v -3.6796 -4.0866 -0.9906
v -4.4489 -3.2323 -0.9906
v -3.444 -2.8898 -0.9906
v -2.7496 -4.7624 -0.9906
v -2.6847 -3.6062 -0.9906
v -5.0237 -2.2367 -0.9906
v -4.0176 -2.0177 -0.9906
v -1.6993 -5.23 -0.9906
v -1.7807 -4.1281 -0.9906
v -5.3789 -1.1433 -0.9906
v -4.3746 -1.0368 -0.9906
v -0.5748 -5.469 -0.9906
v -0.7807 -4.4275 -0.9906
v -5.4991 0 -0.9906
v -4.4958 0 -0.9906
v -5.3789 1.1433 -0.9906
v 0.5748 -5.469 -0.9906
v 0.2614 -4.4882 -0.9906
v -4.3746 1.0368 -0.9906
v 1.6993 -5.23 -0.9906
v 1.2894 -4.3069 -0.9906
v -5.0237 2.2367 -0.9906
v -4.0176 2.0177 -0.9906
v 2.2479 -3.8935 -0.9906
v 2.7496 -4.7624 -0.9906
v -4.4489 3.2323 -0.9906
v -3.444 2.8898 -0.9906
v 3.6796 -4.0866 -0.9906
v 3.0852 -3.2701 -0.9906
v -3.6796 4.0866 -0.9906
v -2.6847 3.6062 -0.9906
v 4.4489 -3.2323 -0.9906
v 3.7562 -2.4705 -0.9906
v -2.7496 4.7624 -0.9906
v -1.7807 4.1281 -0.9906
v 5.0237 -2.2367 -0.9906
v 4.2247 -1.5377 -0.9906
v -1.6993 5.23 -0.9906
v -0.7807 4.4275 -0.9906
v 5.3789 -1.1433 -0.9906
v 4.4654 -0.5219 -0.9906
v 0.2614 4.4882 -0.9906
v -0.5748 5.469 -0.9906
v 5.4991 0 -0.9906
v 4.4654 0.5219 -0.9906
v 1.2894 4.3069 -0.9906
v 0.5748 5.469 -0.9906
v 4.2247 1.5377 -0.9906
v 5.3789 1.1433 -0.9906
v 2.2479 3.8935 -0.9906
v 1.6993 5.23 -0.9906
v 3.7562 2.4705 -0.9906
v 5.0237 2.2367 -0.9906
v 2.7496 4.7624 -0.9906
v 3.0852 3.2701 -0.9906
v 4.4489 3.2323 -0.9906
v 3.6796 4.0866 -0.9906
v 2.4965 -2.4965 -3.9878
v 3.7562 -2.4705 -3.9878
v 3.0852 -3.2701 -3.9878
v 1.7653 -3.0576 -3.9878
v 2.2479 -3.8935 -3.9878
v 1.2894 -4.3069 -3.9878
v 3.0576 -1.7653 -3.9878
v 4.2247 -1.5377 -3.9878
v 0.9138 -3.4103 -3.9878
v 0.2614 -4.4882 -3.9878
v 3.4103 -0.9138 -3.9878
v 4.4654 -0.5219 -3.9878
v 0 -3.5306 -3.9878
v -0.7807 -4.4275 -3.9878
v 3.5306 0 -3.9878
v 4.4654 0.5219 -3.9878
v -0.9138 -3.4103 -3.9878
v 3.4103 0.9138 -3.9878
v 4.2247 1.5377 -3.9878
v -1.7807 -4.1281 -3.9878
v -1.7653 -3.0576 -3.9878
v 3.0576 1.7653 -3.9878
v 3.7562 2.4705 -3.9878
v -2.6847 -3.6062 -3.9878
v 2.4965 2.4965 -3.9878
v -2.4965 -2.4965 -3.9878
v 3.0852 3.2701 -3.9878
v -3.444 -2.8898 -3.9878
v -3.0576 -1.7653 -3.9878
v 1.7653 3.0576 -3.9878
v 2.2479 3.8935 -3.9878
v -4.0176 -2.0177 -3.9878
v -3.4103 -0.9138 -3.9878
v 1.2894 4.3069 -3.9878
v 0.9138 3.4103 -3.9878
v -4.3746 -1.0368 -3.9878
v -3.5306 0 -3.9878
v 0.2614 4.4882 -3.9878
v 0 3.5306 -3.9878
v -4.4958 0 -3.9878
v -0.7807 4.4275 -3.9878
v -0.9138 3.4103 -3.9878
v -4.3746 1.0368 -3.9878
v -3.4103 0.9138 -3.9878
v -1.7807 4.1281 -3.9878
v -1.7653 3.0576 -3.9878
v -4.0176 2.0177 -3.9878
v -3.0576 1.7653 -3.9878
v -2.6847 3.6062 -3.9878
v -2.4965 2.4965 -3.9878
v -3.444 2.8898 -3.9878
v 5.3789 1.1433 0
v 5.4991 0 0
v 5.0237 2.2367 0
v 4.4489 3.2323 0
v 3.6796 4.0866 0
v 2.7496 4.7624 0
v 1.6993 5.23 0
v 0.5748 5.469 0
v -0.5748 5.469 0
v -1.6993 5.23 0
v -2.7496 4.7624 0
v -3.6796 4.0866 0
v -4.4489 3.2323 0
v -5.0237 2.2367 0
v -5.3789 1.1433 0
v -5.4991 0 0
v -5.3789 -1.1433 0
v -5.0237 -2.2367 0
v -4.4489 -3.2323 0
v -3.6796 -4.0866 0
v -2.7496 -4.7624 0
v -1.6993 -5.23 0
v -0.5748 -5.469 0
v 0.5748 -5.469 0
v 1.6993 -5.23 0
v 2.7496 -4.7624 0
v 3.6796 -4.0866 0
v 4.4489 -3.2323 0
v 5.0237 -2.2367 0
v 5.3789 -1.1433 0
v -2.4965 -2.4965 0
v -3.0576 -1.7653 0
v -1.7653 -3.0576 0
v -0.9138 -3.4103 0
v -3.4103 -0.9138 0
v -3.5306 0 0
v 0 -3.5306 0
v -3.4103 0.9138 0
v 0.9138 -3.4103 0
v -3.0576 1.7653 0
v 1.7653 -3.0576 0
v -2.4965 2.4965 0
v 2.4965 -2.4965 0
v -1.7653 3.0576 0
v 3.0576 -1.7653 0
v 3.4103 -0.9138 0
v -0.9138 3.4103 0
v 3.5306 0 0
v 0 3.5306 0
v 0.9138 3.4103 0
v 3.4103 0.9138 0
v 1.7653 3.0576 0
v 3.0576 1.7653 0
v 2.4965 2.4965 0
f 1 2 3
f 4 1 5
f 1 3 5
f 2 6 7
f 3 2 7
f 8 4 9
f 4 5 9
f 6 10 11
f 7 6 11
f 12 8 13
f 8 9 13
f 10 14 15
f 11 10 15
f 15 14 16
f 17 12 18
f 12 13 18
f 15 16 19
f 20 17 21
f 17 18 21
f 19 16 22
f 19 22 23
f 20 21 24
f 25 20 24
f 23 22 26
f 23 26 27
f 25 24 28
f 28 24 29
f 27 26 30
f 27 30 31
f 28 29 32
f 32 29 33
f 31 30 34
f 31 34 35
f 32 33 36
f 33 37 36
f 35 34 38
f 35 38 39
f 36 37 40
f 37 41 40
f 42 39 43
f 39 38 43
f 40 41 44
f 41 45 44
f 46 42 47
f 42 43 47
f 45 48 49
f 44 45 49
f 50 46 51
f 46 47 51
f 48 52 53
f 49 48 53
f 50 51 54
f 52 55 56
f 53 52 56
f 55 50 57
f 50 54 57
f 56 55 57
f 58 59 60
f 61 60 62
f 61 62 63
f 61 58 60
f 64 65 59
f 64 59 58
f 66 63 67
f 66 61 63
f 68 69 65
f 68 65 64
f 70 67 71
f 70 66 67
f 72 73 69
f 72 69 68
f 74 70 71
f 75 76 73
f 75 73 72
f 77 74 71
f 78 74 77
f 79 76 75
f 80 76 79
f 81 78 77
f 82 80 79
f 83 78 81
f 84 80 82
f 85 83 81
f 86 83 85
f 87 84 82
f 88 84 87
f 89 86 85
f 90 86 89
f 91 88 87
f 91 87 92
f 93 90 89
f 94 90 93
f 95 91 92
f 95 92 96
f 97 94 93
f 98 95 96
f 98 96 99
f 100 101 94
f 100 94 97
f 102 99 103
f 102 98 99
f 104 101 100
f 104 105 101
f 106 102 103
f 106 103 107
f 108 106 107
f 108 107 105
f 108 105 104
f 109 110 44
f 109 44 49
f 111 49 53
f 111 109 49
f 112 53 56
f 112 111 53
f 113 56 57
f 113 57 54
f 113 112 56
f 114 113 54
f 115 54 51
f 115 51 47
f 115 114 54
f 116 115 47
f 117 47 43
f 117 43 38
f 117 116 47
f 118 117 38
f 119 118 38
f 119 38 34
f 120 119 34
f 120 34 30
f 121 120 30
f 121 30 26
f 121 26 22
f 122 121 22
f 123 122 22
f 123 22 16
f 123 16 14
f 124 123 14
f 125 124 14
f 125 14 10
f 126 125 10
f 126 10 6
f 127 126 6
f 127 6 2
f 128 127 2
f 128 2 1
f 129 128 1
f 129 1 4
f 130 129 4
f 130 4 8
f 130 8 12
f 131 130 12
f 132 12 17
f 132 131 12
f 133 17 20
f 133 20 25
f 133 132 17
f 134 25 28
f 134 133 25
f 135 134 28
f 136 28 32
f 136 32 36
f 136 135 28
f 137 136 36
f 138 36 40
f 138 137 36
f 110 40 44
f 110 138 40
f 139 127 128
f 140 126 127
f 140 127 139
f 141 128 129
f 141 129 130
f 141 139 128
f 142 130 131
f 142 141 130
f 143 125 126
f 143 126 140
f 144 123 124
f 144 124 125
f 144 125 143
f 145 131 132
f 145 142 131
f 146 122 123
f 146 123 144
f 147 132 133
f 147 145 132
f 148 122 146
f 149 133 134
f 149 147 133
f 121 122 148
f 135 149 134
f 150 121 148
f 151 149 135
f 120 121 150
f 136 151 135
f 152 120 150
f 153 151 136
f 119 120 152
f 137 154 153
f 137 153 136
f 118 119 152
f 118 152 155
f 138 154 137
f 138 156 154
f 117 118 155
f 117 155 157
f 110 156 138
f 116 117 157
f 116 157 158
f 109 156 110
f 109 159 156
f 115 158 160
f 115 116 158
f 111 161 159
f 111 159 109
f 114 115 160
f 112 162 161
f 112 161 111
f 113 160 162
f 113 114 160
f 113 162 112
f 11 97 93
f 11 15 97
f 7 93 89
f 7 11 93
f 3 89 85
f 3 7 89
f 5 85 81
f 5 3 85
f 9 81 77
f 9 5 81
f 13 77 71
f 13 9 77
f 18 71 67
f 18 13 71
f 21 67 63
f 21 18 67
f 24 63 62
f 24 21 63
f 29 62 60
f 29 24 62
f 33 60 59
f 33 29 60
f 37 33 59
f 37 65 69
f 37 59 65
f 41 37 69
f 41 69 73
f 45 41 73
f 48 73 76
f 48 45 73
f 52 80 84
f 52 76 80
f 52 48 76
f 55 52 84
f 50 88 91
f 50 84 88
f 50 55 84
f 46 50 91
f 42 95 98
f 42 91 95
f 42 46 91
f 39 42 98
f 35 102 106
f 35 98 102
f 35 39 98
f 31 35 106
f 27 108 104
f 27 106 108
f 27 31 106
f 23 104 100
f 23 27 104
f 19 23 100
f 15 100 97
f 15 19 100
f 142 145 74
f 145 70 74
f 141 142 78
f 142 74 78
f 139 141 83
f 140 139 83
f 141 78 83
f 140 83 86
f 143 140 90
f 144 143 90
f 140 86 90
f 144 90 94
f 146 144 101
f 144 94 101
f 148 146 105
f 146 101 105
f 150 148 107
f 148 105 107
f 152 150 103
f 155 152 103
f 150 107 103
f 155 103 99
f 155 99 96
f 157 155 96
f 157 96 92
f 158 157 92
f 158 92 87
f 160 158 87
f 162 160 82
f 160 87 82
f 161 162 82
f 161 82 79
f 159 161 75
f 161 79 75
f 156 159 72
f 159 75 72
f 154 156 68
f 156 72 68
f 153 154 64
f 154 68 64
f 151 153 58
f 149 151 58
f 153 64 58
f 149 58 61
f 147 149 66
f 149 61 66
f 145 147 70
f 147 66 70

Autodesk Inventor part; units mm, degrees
ref_plane "YZ Plane" through (0, 0, 0) normal (1, 0, 0) x (0, 1, 0)
ref_plane "XZ Plane" through (0, 0, 0) normal (0, 1, 0) x (-1, 0, 0)
ref_plane "XY Plane" through (0, 0, 0) normal (0, 0, 1) x (1, 0, 0)
sketch "Sketch1" plane through (0, 0, 0) normal (0, 0, 1) x (1, 0, 0)
  circle A0 centre (0, 0) radius 5.4991
  dimension "d0" = 10.9982
extrude "Extrusion1" add sketch "Sketch1" against normal blind 0.9906
sketch "Sketch2" plane through (0, 0, -0.9906) normal (0, 0, -1) x (-1, 0, 0)
  circle A0 centre (0, 0) radius 5.4991 projected
  circle A1 centre (0, 0) radius 4.4958
  dimension "d3" = 8.9916
extrude "Extrusion2" add sketch "Sketch2" along normal blind 2.9972 contours A1
sketch "Sketch3" plane through (0, 0, 0) normal (0, 0, 1) x (1, 0, 0)
  circle A0 centre (0, 0) radius 5.4991 projected
hole "Hole1" at (0, 0, 0) direction (0, 0, -1) diameter 7.0612 end through all
properties part number "276-2181-011 Rev1"
